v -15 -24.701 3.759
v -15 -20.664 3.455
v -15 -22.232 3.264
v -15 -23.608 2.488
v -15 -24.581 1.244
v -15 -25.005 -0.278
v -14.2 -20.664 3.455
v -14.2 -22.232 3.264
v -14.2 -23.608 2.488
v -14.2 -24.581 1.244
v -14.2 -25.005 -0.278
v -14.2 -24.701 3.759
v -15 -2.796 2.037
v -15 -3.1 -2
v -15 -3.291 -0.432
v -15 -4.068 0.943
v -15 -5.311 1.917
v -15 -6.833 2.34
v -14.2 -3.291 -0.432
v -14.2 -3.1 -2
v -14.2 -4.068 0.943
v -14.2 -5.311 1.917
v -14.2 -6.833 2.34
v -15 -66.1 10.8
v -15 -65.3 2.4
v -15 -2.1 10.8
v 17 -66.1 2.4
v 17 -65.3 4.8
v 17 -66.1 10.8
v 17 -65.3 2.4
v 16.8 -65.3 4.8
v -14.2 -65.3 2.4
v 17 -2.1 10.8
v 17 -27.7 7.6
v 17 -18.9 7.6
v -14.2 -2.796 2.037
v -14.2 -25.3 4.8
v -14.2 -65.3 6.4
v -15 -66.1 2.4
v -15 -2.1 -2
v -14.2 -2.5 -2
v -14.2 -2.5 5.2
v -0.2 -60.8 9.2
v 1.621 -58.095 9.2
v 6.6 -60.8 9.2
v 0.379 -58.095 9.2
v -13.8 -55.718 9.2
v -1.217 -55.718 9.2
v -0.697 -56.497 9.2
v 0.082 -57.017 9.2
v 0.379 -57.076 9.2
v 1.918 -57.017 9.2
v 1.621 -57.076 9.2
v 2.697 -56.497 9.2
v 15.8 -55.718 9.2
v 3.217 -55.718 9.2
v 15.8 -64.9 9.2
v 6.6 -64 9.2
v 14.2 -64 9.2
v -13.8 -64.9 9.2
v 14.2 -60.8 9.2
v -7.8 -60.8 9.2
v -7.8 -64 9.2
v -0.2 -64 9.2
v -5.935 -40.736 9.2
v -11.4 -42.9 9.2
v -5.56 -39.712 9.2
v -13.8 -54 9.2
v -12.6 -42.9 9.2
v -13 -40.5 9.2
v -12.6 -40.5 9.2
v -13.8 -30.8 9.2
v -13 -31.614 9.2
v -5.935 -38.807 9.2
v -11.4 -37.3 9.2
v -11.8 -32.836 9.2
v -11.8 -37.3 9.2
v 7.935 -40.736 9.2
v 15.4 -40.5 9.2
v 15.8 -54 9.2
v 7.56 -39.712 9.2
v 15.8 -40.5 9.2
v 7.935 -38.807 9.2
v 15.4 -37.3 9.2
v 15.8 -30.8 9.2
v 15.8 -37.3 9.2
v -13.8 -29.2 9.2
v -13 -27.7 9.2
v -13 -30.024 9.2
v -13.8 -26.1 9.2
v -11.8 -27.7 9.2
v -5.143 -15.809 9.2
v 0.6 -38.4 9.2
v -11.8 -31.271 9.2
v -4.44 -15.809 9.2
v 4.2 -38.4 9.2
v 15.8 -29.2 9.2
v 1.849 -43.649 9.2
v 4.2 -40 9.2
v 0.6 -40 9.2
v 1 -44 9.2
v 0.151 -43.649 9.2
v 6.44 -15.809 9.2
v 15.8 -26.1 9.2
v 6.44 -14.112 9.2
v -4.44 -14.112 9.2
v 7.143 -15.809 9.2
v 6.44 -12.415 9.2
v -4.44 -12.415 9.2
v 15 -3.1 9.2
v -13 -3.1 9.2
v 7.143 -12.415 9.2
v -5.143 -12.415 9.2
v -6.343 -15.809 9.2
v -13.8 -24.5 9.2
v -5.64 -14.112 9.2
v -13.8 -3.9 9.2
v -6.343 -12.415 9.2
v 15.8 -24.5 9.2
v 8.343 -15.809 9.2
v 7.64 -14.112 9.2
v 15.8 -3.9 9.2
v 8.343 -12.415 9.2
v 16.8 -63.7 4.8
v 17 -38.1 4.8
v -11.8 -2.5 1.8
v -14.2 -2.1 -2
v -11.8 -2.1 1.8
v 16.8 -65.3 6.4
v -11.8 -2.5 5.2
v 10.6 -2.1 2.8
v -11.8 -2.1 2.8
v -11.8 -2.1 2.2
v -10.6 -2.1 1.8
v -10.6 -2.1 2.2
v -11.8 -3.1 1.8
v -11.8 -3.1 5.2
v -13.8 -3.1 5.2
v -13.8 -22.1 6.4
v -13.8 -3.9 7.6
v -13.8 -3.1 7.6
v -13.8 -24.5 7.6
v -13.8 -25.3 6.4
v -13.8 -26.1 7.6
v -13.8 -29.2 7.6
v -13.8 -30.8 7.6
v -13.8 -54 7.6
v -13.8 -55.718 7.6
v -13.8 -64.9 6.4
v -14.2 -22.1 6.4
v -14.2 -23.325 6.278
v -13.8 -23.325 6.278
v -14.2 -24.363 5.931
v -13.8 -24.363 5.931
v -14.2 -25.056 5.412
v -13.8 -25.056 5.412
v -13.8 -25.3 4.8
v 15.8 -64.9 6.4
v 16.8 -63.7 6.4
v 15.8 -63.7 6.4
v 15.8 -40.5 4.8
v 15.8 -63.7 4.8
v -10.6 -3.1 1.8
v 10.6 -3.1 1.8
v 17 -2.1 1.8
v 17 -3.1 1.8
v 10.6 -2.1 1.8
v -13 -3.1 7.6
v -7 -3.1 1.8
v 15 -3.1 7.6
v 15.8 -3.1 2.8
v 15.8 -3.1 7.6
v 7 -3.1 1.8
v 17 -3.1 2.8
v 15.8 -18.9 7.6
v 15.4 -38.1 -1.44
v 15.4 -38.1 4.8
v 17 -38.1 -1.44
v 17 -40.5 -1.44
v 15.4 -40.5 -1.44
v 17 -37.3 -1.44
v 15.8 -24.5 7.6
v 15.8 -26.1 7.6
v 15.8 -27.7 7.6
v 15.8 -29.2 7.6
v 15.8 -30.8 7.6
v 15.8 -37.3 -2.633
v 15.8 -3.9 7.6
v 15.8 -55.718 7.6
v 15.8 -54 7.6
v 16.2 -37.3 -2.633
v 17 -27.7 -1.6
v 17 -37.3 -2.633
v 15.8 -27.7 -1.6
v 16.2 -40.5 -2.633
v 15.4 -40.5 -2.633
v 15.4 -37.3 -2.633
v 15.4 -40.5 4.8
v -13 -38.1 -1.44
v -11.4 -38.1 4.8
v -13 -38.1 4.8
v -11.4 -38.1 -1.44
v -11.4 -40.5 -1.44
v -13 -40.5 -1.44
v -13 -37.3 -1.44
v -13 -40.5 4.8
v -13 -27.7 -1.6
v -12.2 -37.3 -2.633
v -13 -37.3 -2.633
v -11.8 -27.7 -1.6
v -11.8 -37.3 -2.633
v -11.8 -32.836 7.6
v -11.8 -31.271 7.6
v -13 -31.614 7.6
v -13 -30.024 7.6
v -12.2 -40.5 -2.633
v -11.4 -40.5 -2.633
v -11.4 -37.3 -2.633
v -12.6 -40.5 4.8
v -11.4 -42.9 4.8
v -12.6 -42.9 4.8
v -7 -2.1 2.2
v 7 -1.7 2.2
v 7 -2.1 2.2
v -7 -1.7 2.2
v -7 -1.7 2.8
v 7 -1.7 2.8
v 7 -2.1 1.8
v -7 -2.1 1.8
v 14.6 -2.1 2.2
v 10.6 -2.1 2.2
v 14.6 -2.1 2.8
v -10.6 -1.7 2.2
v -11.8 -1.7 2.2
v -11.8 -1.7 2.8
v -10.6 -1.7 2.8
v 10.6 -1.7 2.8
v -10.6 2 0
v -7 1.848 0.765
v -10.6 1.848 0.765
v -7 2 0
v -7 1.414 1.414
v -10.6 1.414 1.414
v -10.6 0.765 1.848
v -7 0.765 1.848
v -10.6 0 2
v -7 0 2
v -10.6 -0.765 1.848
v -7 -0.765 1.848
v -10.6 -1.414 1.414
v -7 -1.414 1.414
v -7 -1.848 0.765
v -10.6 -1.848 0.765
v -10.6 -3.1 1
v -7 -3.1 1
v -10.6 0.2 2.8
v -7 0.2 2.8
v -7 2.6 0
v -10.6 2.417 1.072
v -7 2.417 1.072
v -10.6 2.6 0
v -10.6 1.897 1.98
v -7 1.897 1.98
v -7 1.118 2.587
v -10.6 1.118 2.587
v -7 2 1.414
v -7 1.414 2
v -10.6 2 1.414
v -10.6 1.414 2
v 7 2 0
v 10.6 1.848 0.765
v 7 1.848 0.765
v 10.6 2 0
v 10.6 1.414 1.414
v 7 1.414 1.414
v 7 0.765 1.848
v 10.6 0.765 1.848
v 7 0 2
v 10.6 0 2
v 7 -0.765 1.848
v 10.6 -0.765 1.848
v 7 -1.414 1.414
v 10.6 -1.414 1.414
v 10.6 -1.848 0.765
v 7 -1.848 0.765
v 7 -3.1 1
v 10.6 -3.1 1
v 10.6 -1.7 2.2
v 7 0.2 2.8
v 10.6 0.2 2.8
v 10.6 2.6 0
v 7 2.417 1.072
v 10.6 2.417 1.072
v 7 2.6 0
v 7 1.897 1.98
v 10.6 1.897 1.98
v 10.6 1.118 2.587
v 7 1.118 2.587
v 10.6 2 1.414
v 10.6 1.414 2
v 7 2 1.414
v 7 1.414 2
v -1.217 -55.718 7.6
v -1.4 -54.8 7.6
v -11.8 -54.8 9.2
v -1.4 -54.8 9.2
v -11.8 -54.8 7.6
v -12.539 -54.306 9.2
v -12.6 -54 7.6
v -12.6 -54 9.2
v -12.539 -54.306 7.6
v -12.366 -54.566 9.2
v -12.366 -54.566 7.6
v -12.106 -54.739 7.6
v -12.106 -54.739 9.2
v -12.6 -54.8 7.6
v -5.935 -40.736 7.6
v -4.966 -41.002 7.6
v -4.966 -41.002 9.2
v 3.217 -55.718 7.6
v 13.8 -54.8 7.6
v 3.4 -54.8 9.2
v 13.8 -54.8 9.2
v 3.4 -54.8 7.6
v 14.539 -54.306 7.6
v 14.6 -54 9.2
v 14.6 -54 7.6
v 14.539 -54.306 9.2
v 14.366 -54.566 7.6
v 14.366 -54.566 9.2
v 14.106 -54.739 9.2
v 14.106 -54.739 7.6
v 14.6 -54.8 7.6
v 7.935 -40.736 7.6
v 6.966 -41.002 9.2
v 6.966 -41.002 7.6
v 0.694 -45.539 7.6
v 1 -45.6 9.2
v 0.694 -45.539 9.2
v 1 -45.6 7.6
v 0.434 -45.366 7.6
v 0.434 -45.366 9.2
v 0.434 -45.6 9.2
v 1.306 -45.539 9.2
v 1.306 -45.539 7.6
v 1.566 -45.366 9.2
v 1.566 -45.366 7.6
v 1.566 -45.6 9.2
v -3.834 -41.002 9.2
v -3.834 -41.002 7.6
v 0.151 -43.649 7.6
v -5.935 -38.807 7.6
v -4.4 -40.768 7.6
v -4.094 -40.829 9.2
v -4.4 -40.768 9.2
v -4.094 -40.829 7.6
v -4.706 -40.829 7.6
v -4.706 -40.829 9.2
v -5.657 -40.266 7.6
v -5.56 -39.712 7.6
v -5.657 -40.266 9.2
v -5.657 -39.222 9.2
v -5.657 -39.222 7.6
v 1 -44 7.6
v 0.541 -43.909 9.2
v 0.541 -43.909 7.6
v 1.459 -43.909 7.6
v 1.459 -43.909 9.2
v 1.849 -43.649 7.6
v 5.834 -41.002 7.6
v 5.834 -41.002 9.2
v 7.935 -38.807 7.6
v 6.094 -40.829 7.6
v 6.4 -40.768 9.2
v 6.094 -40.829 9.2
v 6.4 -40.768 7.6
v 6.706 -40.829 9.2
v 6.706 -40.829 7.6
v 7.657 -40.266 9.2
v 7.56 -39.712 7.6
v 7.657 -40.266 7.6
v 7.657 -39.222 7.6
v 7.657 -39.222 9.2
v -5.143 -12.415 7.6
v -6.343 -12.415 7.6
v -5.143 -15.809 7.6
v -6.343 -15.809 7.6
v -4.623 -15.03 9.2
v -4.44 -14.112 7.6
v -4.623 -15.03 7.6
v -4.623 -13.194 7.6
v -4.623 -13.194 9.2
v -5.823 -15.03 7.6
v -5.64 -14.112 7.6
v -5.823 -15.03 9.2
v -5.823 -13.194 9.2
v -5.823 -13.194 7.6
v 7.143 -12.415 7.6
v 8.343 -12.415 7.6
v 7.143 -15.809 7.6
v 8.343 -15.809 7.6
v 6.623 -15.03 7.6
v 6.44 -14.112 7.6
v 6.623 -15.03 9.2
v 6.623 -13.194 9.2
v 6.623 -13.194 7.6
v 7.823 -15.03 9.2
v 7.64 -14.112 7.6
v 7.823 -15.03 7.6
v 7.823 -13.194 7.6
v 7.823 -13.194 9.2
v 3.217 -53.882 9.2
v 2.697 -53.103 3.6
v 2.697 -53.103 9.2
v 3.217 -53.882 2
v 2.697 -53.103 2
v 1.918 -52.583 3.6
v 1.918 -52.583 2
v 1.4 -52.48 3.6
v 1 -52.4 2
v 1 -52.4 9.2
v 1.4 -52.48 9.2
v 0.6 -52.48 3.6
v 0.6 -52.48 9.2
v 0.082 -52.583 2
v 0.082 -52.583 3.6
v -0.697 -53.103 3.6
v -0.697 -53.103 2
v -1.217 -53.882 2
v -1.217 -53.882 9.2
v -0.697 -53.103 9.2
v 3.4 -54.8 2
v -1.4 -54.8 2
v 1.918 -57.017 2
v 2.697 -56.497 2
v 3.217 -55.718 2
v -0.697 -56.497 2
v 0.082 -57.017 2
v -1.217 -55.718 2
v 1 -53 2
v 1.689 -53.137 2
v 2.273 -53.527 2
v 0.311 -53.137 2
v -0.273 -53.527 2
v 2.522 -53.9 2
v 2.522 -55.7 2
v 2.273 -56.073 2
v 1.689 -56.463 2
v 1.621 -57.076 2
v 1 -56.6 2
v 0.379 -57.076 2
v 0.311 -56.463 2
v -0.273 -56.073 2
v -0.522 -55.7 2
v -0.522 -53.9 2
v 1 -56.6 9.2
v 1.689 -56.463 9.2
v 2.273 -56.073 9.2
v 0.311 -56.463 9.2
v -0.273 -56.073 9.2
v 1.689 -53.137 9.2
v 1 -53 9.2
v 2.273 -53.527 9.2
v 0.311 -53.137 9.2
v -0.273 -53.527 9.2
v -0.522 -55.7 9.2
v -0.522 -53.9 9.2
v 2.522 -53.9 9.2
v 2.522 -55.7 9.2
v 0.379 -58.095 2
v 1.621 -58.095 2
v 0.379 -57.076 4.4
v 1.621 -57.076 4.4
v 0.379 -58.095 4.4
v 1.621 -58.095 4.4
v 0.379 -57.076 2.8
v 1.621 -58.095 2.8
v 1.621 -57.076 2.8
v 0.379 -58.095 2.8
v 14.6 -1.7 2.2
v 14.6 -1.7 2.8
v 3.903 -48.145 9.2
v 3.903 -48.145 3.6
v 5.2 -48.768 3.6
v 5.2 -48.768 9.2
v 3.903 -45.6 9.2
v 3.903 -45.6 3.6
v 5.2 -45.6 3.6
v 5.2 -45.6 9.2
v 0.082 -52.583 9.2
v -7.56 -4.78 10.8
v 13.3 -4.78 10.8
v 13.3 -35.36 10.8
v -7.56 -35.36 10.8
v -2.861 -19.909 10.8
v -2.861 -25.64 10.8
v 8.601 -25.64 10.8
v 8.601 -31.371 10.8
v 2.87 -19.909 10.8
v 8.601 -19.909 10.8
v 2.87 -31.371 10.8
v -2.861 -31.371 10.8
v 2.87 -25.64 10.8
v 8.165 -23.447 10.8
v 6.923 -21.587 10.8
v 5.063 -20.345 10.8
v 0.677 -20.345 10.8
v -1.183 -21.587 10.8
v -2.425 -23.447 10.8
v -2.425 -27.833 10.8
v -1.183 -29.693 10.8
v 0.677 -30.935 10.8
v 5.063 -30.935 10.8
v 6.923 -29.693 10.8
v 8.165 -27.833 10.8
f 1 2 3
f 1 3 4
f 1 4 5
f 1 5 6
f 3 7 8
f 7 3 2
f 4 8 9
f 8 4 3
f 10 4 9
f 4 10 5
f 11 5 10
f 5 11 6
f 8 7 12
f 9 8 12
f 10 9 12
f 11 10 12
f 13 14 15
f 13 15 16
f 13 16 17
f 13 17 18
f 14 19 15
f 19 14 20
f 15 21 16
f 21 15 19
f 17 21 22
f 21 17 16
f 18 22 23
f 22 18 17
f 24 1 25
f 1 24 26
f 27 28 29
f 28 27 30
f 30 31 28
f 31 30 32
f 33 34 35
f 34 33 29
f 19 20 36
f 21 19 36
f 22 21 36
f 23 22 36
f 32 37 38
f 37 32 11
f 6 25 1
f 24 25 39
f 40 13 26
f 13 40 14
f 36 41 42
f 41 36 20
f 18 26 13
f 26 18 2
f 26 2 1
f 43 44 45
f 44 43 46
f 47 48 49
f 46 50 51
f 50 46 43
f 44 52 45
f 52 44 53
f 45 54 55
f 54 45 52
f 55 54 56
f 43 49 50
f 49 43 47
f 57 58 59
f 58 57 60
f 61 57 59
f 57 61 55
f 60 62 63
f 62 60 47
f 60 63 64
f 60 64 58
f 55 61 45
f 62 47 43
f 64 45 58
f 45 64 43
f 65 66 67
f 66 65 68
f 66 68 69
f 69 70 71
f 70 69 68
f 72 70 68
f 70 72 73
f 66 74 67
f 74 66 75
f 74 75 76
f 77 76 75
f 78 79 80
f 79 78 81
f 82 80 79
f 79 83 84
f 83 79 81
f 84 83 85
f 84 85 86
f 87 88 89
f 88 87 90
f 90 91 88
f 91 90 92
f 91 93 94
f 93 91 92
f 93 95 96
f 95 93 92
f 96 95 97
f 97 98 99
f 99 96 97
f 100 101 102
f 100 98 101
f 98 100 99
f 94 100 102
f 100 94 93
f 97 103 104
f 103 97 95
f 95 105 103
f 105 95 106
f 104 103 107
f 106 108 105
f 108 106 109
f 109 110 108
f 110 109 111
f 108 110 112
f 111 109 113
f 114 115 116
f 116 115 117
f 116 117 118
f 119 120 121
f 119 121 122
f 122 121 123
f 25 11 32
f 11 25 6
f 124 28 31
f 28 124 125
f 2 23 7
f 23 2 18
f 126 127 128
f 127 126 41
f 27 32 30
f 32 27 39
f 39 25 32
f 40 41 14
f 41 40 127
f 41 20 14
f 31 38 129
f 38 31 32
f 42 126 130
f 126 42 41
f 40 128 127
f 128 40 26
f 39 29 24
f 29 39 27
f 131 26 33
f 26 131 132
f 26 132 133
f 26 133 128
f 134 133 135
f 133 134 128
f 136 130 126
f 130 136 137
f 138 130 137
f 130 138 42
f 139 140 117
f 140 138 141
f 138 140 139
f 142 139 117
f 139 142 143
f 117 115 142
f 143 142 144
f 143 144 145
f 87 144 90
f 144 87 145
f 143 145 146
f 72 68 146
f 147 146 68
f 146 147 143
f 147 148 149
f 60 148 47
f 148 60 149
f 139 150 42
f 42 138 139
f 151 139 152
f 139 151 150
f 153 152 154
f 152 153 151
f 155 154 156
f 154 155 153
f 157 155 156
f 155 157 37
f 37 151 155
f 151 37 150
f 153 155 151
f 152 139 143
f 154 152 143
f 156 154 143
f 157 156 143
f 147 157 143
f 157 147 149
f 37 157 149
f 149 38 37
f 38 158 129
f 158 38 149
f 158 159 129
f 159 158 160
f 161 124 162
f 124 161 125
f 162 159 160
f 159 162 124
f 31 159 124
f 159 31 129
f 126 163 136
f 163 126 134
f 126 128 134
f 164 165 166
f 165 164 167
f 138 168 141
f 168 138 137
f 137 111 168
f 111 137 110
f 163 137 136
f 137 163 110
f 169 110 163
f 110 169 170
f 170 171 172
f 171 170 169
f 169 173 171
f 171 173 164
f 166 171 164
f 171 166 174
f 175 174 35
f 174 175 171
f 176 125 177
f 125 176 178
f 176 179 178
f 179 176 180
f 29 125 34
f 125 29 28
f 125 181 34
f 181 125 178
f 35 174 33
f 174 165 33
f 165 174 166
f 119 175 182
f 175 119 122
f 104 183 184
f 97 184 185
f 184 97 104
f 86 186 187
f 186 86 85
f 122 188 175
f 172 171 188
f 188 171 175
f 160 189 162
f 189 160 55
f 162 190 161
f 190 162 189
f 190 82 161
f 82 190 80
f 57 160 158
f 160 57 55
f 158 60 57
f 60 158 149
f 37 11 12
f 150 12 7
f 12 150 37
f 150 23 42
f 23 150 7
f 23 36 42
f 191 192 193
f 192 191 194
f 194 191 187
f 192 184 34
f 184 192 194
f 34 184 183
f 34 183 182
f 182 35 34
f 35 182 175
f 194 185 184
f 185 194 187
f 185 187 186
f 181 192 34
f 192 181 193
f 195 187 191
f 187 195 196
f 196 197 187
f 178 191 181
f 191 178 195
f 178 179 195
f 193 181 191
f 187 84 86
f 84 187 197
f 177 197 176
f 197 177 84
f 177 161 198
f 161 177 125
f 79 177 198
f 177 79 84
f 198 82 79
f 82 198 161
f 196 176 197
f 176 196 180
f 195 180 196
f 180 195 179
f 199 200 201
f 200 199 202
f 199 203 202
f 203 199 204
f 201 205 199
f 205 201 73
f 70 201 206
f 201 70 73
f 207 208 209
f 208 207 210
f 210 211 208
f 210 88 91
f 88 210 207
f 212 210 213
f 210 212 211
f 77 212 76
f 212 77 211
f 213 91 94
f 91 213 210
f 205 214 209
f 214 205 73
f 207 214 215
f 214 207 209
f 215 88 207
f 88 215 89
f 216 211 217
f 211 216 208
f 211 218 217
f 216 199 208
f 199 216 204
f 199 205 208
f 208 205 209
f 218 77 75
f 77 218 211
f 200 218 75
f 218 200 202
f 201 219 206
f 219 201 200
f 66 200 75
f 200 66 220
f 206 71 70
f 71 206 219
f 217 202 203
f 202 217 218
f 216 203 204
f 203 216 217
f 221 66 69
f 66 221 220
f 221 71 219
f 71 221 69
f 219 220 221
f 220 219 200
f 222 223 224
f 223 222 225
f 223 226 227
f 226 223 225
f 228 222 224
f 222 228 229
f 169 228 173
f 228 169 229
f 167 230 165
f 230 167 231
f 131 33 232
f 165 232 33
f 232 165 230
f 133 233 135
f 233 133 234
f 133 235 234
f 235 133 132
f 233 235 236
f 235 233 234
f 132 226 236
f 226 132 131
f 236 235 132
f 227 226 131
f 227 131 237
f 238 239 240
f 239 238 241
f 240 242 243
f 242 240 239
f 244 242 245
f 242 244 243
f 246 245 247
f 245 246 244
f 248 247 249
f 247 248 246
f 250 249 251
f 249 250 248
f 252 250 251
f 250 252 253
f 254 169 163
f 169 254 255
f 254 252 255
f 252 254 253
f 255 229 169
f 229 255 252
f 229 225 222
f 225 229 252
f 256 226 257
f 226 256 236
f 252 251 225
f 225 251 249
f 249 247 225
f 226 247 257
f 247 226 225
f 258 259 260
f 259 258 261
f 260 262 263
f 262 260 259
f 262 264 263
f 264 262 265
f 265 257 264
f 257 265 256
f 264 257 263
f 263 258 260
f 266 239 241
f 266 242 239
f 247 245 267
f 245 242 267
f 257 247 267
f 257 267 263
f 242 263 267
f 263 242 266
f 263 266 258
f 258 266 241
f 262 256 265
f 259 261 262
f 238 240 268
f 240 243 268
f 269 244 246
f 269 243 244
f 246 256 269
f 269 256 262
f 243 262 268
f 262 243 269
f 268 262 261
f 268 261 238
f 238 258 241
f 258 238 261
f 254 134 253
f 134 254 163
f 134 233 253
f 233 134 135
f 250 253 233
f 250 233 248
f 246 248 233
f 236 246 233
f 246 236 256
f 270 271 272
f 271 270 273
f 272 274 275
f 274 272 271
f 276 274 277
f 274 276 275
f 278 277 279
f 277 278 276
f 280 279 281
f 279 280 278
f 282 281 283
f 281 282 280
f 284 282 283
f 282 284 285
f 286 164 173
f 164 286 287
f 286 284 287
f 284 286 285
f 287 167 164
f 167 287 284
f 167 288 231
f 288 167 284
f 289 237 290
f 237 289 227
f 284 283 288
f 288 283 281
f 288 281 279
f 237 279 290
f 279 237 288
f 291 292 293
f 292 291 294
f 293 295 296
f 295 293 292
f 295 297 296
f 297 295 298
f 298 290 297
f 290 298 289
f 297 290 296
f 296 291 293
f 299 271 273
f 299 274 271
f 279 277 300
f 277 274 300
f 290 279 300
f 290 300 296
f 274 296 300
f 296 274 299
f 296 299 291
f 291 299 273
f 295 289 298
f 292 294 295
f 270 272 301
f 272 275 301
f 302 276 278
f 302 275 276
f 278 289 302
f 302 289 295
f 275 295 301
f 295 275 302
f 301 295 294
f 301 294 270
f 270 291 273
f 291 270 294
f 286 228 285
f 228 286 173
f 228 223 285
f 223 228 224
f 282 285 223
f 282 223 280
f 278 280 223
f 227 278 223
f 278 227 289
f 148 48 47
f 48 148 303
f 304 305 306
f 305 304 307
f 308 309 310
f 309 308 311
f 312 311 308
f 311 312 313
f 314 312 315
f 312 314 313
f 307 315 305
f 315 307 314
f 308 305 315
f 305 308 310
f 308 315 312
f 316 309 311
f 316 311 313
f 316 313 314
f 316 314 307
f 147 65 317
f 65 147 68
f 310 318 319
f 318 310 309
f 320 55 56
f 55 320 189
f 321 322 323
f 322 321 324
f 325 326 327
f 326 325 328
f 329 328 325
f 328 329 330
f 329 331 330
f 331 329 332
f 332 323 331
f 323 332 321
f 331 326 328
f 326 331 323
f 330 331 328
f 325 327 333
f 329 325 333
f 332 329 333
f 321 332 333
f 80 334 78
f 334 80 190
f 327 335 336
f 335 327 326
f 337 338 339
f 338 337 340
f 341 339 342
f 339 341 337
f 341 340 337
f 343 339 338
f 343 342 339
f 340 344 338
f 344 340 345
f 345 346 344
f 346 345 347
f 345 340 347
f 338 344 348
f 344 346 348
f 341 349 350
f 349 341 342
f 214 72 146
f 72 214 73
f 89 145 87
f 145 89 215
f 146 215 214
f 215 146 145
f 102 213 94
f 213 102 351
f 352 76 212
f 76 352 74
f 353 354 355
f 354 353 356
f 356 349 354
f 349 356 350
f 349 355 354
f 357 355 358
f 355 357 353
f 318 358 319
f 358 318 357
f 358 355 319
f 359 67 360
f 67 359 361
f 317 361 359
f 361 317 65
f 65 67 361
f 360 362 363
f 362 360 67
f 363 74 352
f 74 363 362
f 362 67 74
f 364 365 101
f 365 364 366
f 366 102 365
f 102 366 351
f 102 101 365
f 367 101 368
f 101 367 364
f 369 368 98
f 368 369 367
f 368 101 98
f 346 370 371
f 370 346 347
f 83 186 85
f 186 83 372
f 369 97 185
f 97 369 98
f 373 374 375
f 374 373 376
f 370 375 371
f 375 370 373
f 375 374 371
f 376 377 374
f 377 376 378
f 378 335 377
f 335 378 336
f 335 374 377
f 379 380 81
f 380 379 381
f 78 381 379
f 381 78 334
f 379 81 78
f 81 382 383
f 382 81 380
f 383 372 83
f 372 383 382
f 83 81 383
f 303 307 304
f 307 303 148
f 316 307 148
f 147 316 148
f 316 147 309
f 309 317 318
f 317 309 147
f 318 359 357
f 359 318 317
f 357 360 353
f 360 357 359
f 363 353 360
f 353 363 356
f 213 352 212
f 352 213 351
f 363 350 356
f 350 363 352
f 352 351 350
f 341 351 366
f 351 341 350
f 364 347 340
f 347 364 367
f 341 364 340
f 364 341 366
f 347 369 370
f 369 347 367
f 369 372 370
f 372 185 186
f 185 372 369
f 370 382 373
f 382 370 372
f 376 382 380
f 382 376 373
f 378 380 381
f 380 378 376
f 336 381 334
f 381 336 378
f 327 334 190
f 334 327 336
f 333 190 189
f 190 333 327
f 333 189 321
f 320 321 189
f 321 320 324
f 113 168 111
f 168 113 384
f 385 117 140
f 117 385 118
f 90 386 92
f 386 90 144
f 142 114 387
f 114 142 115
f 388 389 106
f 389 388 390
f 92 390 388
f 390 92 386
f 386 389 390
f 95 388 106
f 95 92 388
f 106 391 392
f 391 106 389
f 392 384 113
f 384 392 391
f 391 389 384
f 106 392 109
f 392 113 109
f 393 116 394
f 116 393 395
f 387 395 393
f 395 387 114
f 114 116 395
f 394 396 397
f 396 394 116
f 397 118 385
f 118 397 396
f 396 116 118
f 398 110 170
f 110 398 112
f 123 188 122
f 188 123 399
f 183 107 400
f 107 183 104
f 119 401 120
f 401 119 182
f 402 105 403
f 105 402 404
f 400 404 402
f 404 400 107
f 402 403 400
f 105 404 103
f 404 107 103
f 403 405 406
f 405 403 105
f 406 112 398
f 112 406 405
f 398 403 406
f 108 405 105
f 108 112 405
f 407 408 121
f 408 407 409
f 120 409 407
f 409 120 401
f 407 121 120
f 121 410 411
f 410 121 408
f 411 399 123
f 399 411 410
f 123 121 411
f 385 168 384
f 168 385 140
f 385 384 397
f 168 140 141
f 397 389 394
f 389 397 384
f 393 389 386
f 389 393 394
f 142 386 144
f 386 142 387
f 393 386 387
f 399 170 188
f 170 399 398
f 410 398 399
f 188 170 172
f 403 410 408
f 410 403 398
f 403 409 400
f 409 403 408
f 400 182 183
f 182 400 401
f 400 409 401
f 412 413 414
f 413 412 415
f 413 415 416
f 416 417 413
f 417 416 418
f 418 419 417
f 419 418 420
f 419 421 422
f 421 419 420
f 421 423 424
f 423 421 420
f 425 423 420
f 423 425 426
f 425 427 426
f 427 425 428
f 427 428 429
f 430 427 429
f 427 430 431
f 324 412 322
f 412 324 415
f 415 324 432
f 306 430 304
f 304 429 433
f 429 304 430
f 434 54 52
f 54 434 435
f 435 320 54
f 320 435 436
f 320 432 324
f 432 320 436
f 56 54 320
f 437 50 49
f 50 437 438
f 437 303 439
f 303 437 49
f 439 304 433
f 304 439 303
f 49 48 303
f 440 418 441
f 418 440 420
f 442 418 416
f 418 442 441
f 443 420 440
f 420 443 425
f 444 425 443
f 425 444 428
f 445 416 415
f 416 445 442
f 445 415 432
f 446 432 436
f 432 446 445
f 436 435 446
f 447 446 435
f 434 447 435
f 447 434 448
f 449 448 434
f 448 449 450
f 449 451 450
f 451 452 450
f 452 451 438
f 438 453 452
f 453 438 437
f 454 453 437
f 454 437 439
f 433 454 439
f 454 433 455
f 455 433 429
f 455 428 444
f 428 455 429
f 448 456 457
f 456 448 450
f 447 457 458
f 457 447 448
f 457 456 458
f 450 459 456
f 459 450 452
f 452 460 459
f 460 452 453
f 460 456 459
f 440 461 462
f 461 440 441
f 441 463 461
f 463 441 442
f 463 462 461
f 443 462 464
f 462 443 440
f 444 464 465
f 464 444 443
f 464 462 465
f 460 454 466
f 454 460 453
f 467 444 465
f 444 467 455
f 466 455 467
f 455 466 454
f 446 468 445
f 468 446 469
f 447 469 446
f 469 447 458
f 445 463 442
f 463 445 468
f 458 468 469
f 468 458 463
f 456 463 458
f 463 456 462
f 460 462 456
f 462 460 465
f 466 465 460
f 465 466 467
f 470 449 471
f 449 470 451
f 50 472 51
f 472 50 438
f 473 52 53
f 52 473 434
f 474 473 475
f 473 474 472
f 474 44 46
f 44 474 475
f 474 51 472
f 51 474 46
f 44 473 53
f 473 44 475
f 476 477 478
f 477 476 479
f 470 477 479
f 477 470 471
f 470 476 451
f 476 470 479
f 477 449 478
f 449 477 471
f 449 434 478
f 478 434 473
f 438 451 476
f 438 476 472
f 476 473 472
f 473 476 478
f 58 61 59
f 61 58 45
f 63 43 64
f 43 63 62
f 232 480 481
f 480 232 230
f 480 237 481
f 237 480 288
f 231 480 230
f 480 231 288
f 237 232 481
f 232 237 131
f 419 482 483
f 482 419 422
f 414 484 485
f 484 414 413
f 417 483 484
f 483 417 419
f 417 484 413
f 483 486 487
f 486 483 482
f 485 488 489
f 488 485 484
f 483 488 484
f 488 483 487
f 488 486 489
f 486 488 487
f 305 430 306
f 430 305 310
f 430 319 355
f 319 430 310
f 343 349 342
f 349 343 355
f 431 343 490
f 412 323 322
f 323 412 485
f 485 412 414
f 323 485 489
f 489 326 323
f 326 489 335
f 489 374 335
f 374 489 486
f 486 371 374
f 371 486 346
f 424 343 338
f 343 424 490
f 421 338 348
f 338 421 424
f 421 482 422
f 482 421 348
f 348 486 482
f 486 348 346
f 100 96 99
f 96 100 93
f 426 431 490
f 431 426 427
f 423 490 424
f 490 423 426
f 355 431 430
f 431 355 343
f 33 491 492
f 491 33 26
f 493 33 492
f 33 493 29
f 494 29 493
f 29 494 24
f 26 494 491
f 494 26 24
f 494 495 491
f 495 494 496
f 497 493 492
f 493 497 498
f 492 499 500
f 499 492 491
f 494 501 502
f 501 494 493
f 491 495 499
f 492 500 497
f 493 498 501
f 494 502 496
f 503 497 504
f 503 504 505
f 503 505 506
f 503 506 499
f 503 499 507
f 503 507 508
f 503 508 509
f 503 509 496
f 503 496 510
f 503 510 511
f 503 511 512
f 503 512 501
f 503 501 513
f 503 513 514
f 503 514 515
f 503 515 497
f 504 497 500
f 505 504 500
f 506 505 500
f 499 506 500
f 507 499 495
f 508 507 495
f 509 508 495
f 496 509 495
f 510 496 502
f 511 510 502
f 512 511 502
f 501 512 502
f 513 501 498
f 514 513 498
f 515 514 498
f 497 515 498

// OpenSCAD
use <../lib.scad>
use <../p/4-4disc.scad>
use <../p/4-4ndis.scad>
use <s/4112s01.scad>
use <s/4112s03.scad>
function ldraw_lib__4112p02() = [
// 0 ~Electric Switch: Key Left with Red Signal Pattern
// 0 Name: 4112p02.dat
// 0 Author: Javier Orquera [kuramapika1]
// 0 !LDRAW_ORG Part UPDATE 2025-09
// 0 !LICENSE Licensed under CC BY 4.0 : see CAreadme.txt
// 
// 0 !HELP to put this part into a pressed-down state, rotate it 4.3 degrees
// 0 !HELP around the x-axis
// 
// 0 BFC CERTIFY CCW
  [0,"BFC","CERTIFY"],
  [0,"BFC","CCW"],
// 
// 0 !KEYWORDS Set 5081, Set 7860, switch, Train
// 
// 0 !HISTORY 2025-04-24 [kuramapika1] Adapted surfaces
// 0 !HISTORY 2025-09-11 [kuramapika1] Use of new subfile
// 0 !HISTORY 2025-09-29 [OrionP] Official Update 2025-09
// 
// 1 16 0 0 0 1 0 0 0 1 0 0 0 1 s\4112s01.dat
  [1,16,0,0,0,1,0,0,0,1,0,0,0,1, ldraw_lib__s__4112s01()],
// 1 16 0 0 0 1 0 0 0 1 0 0 0 1 s\4112s03.dat
  [1,16,0,0,0,1,0,0,0,1,0,0,0,1, ldraw_lib__s__4112s03()],
// 4 16 -18.9 -27 -11.95 33.25 -27 -11.95 42.5 -27 -5.25 -37.5 -27 -5.25
  [4,16,-18.9,-27,-11.95,33.25,-27,-11.95,42.5,-27,-5.25,-37.5,-27,-5.25],
// 4 16 42.5 -27 -5.25 33.25 -27 -11.95 33.25 -27 -88.4 42.5 -27 -165.25
  [4,16,42.5,-27,-5.25,33.25,-27,-11.95,33.25,-27,-88.4,42.5,-27,-165.25],
// 4 16 -37.5 -27 -165.25 42.5 -27 -165.25 33.25 -27 -88.4 -18.9 -27 -88.4
  [4,16,-37.5,-27,-165.25,42.5,-27,-165.25,33.25,-27,-88.4,-18.9,-27,-88.4],
// 4 16 -18.9 -27 -11.95 -37.5 -27 -5.25 -37.5 -27 -165.25 -18.9 -27 -88.4
  [4,16,-18.9,-27,-11.95,-37.5,-27,-5.25,-37.5,-27,-165.25,-18.9,-27,-88.4],
// 4 0 -7.1534 -27 -64.1 -7.1534 -27 -49.7716 -18.9 -27 -11.95 -18.9 -27 -88.4
  [4,0,-7.1534,-27,-64.1,-7.1534,-27,-49.7716,-18.9,-27,-11.95,-18.9,-27,-88.4],
// 4 0 33.25 -27 -88.4 33.25 -27 -11.95 21.5034 -27 -64.1 21.5034 -27 -78.4284
  [4,0,33.25,-27,-88.4,33.25,-27,-11.95,21.5034,-27,-64.1,21.5034,-27,-78.4284],
// 4 0 -18.9 -27 -11.95 7.175 -27 -49.7716 21.5034 -27 -49.7716 33.25 -27 -11.95
  [4,0,-18.9,-27,-11.95,7.175,-27,-49.7716,21.5034,-27,-49.7716,33.25,-27,-11.95],
// 4 0 -7.1534 -27 -78.4284 -18.9 -27 -88.4 33.25 -27 -88.4 7.175 -27 -78.4284
  [4,0,-7.1534,-27,-78.4284,-18.9,-27,-88.4,33.25,-27,-88.4,7.175,-27,-78.4284],
// 3 0 -18.9 -27 -11.95 -7.1534 -27 -49.7716 7.175 -27 -49.7716
  [3,0,-18.9,-27,-11.95,-7.1534,-27,-49.7716,7.175,-27,-49.7716],
// 3 0 33.25 -27 -11.95 21.5034 -27 -49.7716 21.5034 -27 -64.1
  [3,0,33.25,-27,-11.95,21.5034,-27,-49.7716,21.5034,-27,-64.1],
// 3 0 33.25 -27 -88.4 21.5034 -27 -78.4284 7.175 -27 -78.4284
  [3,0,33.25,-27,-88.4,21.5034,-27,-78.4284,7.175,-27,-78.4284],
// 3 0 -18.9 -27 -88.4 -7.1534 -27 -78.4284 -7.1534 -27 -64.1
  [3,0,-18.9,-27,-88.4,-7.1534,-27,-78.4284,-7.1534,-27,-64.1],
// 1 4 7.175 -27 -64.1 14.3284 0 0 0 1 0 0 0 14.3284 4-4disc.dat
  [1,4,7.175,-27,-64.1,14.3284,0,0,0,1,0,0,0,14.3284, ldraw_lib__4_4disc()],
// 1 0 7.175 -27 -64.1 14.3284 0 0 0 1 0 0 0 14.3284 4-4ndis.dat
  [1,0,7.175,-27,-64.1,14.3284,0,0,0,1,0,0,0,14.3284, ldraw_lib__4_4ndis()],
];
module ldraw_lib__4112p02(step=0, col=false, unit=2/5, alt=false, line=0.2, solid=!$preview)
    makepoly(ldraw_lib__4112p02(), step=step, col=col, unit=unit, alt=alt, line=line, solid=solid);
ldraw_lib__4112p02(line=0.2);
